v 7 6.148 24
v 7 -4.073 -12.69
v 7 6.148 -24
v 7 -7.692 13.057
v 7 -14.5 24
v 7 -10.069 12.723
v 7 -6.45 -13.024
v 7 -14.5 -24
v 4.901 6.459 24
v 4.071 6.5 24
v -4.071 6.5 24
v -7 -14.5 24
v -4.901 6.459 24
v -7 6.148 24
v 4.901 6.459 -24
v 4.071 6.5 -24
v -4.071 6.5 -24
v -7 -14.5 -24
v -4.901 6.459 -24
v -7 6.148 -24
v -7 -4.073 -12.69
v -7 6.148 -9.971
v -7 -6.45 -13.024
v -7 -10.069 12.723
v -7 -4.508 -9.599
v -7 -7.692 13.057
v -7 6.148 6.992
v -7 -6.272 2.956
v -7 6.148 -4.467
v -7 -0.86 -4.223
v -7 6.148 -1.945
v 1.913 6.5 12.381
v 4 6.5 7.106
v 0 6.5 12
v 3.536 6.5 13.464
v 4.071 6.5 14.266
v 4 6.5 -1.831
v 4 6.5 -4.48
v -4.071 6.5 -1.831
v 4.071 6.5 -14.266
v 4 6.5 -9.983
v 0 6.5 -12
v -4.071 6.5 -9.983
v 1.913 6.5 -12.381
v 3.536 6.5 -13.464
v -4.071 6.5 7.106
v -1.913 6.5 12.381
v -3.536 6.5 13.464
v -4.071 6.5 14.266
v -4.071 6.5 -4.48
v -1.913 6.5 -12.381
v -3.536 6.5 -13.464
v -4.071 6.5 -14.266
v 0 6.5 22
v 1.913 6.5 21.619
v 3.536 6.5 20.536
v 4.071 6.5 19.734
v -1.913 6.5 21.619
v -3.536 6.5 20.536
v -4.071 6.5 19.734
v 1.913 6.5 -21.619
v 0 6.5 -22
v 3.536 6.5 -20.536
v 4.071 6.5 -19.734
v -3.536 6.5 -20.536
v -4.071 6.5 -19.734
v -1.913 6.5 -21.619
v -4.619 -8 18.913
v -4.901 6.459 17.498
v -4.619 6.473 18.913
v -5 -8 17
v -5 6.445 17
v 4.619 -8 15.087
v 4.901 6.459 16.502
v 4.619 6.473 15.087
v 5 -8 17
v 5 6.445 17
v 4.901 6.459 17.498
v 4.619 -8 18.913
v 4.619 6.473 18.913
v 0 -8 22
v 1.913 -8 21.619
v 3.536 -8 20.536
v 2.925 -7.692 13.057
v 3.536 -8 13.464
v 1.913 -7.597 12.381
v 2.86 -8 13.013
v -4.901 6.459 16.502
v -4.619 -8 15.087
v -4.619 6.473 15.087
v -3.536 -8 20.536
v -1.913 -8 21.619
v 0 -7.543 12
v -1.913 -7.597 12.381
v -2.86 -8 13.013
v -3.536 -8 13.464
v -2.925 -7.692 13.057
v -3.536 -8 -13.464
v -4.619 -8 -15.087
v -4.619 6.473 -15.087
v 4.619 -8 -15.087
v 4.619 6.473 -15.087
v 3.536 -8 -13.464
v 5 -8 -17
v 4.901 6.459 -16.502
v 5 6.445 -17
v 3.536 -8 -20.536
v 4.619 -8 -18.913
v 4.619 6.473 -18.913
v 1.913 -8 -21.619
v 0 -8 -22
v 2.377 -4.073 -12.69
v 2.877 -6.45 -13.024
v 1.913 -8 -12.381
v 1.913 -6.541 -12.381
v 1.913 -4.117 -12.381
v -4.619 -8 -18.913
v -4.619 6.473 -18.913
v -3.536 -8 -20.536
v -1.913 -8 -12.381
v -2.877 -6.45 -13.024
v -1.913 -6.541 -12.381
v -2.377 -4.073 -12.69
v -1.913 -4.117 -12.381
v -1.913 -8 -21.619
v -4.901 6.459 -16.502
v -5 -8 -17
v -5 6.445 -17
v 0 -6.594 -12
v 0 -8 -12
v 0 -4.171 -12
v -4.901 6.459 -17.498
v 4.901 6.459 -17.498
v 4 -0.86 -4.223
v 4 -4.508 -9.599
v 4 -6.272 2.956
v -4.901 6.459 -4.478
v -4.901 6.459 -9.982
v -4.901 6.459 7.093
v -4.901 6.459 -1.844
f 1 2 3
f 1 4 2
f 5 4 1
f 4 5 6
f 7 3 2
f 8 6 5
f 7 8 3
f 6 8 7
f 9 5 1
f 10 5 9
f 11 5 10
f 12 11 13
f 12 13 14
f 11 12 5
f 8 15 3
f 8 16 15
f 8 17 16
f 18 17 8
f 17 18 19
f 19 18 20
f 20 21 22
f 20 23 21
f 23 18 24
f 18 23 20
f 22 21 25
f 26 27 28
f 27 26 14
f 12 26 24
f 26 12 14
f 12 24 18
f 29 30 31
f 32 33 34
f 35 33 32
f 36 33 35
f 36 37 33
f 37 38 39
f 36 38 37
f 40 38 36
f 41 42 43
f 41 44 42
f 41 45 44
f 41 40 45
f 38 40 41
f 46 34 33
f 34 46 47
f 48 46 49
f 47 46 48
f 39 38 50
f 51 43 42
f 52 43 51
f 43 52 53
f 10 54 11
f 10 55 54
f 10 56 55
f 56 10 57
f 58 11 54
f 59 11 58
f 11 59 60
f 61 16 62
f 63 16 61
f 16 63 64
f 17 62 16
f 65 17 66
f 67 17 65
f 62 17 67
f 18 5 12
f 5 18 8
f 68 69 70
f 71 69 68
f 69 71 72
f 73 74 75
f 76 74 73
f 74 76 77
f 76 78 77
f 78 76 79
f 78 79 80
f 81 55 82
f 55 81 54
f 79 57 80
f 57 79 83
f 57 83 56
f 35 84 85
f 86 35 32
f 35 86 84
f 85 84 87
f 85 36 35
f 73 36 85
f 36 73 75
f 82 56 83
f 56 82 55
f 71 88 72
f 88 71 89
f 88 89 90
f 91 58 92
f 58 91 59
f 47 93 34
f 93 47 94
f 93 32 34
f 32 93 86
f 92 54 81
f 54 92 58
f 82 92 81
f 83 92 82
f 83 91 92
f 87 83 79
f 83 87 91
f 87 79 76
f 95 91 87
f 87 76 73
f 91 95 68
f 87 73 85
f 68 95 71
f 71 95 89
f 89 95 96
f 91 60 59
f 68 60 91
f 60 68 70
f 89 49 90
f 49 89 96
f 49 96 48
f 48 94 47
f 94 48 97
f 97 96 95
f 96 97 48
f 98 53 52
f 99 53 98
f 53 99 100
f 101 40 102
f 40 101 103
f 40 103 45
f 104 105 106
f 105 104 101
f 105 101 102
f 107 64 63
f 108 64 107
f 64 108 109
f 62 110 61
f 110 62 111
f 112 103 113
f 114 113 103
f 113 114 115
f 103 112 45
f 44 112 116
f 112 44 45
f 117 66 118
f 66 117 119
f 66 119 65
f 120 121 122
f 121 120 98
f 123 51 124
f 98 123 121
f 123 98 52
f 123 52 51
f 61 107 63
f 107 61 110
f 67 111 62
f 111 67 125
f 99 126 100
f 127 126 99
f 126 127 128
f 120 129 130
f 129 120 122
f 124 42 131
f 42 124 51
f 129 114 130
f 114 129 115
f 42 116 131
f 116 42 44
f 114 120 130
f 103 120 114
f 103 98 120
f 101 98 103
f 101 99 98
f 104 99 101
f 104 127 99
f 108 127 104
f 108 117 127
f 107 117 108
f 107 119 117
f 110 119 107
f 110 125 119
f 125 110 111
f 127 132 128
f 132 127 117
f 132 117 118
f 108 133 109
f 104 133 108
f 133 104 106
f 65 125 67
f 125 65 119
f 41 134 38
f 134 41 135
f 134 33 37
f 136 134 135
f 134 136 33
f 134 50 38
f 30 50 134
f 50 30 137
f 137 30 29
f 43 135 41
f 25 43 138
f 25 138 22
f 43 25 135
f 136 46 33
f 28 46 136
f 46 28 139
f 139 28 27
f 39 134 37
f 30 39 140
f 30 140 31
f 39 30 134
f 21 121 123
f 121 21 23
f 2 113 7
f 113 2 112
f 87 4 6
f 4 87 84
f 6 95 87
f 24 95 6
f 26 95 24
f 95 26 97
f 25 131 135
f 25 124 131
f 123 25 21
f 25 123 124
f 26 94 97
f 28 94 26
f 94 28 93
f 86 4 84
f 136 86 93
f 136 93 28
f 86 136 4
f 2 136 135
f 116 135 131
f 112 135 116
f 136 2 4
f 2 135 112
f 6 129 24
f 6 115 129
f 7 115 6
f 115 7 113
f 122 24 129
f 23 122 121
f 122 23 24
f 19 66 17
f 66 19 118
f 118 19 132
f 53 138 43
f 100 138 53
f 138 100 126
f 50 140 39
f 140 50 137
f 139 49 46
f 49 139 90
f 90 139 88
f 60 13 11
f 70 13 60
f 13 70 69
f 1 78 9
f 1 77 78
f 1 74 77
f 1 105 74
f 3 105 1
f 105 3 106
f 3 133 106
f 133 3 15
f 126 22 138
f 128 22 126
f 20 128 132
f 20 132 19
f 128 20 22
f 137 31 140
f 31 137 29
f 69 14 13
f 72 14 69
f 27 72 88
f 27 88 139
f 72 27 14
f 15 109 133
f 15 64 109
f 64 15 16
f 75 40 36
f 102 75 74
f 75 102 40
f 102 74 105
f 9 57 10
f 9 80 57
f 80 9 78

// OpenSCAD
diameter=10;
height=4;
number=3;
distance=5;
baseline=30; 


module maghole(diameter,height,number,back) {
		translate([0,height*(number-2)/2,0])
        rotate([90,0,0])
         cylinder(r=diameter/2,h=height*(2*number-1),center=true);
    if(back == 1) {
		translate([0,-height*2*(number+1)/2,0])
        rotate([90,0,0])
         cylinder(r=diameter/2,h=height*number,center=true);
    }
}

module smaghole(diameter,height,number,back) {
		translate([0,.15+height*(number-2)/2,0])
        rotate([90,0,0])
         cylinder(r=0.3+diameter/2,h=height*(2*number-1),center=true);
    if(back == 1) {
		translate([0,-(0.15+height*2*(number+1)/2),0])
        rotate([90,0,0])
         cylinder(r=0.3+diameter/2,h=height*number,center=true);
    }
}
module mirror(diameter,height,number,distance,baseline) {
width=diameter+4;
depth=distance+height*number+4;
length=baseline+diameter+8;
mirrorthick = 1.8;
   difference() {
     translate([0,-height,0])
	   cube([width,  // Small dimension
            depth, // Optical path dim
		      length],center=true);
      translate([0,0,2+baseline/2])
             maghole(diameter,height,number,0);
     translate([0,0,-(2+baseline/2)])
             maghole(diameter,height,number,0);

     rotate([-2,0,0])
     translate([-4,0.5+depth/4,-7])
          cube([width+2,depth+2.2,((length-2*width)/2)-4.5],center=true);

     rotate([18,0,0])
     translate([-4,depth/4,0.5])
          cube([width+2,depth+2.2,((length-2*width)/2)-1.5],center=true);

    rotate([8,0,0])
     translate([0,-depth/3,1])
          cube([width+2,mirrorthick+0.6,length-(2*diameter+2)],center=true);
     }
}

module sensor(diameter,height,number,distance,baseline) {
width=diameter+4;
depth=distance+height*number+4;
length=baseline+diameter+8;
mirrorthick = 2.6;
extra=2*width+4;

   difference() {
     translate([2+width/2,-height,0])
	   cube([extra,  // Small dimension
            depth, // Optical path dim
		      length],center=true);
      translate([0,0,2+baseline/2])
             smaghole(diameter,height,number,1);
     translate([0,0,-(2+baseline/2)])
             smaghole(diameter,height,number,1);
//LASER
     translate([0,0,4])
        rotate([90,0,0])
             cylinder(r=3.2,h=40,center=true,$fn=24);
//PhotoTransistor
     translate([0,0,-2])
        rotate([90,0,0])
             cylinder(r=2,h=40,center=true,$fn=12);
// TEMP SENSOR
     translate([2+width,0,0])
        rotate([90,0,0])
             cylinder(r=4.7,h=40,center=true);

     }

     difference() {
     translate([0,-4,-2.5])cube([5,6,5],center=true);
     translate([0,-8,0])
        cylinder(r=3.2,h=10,center=true,$fn=12);
     translate([0,0,-1.2])
        rotate([90,0,0])
             cylinder(r=0.6,h=40,center=true,$fn=6);
     translate([0,0,-2.8])
        rotate([90,0,0])
             cylinder(r=0.6,h=40,center=true,$fn=6);
     }
}

module jarwall() {
  difference() {
     cube([40,40,120],center=true);
	  translate([40,0,0])
	     cylinder(r=50,h=120,center=true,$fn=64);
	   }
}

module jar() {
	  translate([-8,110,-10])
	          cylinder(r=50,h=120,center=true,$fn=64);
}

module powerhole(dim) {
offset = dim+2;
  //  cylinder(r=dim,h=2*dim,center=true,$fn=10);
  //  translate([dim-1.6,0,0])
   //   cylinder(r=dim,h=dim,center=true,$fn=10);
    translate([dim-3,0,0]) cube([2*dim+2,2*dim-1,2*dim-1],center=true);
    translate([-offset,0,0])
      cylinder(r=1.1,h=2*dim,center=true,$fn=10);
    translate([offset+2,0,0])
      cylinder(r=1.1,h=2*dim,center=true,$fn=10);
}

module sensordevice() {
  wall = 32;
  side = 44;
  deep = 50;
  difference() { 
   sensor(diameter,height,number,distance,baseline);
   translate([6,-60,3]) jar();
  }
  translate([-7,-(wall+30),21]) cube([wall,side+12,3]);

     translate([-7,-(wall+30),-24])
         cube([wall,side+12,3]);

  difference() {
  translate([23.5,-(wall+7),0])
    rotate([0,90,0])
    cube([side,deep,3],center=true);
     translate([24,-54,12])
			rotate([0,90,0]) 
           powerhole(4.5);
  }
}
module mirrordevice() {
  difference() { 
   mirror(diameter,height,number,distance,baseline);
   translate([0,-3.3,0]) rotate([0,0,-90]) jarwall();
  }
}

//rotate([0,90,180]) 
  // sensordevice();
   mirrordevice();



     
